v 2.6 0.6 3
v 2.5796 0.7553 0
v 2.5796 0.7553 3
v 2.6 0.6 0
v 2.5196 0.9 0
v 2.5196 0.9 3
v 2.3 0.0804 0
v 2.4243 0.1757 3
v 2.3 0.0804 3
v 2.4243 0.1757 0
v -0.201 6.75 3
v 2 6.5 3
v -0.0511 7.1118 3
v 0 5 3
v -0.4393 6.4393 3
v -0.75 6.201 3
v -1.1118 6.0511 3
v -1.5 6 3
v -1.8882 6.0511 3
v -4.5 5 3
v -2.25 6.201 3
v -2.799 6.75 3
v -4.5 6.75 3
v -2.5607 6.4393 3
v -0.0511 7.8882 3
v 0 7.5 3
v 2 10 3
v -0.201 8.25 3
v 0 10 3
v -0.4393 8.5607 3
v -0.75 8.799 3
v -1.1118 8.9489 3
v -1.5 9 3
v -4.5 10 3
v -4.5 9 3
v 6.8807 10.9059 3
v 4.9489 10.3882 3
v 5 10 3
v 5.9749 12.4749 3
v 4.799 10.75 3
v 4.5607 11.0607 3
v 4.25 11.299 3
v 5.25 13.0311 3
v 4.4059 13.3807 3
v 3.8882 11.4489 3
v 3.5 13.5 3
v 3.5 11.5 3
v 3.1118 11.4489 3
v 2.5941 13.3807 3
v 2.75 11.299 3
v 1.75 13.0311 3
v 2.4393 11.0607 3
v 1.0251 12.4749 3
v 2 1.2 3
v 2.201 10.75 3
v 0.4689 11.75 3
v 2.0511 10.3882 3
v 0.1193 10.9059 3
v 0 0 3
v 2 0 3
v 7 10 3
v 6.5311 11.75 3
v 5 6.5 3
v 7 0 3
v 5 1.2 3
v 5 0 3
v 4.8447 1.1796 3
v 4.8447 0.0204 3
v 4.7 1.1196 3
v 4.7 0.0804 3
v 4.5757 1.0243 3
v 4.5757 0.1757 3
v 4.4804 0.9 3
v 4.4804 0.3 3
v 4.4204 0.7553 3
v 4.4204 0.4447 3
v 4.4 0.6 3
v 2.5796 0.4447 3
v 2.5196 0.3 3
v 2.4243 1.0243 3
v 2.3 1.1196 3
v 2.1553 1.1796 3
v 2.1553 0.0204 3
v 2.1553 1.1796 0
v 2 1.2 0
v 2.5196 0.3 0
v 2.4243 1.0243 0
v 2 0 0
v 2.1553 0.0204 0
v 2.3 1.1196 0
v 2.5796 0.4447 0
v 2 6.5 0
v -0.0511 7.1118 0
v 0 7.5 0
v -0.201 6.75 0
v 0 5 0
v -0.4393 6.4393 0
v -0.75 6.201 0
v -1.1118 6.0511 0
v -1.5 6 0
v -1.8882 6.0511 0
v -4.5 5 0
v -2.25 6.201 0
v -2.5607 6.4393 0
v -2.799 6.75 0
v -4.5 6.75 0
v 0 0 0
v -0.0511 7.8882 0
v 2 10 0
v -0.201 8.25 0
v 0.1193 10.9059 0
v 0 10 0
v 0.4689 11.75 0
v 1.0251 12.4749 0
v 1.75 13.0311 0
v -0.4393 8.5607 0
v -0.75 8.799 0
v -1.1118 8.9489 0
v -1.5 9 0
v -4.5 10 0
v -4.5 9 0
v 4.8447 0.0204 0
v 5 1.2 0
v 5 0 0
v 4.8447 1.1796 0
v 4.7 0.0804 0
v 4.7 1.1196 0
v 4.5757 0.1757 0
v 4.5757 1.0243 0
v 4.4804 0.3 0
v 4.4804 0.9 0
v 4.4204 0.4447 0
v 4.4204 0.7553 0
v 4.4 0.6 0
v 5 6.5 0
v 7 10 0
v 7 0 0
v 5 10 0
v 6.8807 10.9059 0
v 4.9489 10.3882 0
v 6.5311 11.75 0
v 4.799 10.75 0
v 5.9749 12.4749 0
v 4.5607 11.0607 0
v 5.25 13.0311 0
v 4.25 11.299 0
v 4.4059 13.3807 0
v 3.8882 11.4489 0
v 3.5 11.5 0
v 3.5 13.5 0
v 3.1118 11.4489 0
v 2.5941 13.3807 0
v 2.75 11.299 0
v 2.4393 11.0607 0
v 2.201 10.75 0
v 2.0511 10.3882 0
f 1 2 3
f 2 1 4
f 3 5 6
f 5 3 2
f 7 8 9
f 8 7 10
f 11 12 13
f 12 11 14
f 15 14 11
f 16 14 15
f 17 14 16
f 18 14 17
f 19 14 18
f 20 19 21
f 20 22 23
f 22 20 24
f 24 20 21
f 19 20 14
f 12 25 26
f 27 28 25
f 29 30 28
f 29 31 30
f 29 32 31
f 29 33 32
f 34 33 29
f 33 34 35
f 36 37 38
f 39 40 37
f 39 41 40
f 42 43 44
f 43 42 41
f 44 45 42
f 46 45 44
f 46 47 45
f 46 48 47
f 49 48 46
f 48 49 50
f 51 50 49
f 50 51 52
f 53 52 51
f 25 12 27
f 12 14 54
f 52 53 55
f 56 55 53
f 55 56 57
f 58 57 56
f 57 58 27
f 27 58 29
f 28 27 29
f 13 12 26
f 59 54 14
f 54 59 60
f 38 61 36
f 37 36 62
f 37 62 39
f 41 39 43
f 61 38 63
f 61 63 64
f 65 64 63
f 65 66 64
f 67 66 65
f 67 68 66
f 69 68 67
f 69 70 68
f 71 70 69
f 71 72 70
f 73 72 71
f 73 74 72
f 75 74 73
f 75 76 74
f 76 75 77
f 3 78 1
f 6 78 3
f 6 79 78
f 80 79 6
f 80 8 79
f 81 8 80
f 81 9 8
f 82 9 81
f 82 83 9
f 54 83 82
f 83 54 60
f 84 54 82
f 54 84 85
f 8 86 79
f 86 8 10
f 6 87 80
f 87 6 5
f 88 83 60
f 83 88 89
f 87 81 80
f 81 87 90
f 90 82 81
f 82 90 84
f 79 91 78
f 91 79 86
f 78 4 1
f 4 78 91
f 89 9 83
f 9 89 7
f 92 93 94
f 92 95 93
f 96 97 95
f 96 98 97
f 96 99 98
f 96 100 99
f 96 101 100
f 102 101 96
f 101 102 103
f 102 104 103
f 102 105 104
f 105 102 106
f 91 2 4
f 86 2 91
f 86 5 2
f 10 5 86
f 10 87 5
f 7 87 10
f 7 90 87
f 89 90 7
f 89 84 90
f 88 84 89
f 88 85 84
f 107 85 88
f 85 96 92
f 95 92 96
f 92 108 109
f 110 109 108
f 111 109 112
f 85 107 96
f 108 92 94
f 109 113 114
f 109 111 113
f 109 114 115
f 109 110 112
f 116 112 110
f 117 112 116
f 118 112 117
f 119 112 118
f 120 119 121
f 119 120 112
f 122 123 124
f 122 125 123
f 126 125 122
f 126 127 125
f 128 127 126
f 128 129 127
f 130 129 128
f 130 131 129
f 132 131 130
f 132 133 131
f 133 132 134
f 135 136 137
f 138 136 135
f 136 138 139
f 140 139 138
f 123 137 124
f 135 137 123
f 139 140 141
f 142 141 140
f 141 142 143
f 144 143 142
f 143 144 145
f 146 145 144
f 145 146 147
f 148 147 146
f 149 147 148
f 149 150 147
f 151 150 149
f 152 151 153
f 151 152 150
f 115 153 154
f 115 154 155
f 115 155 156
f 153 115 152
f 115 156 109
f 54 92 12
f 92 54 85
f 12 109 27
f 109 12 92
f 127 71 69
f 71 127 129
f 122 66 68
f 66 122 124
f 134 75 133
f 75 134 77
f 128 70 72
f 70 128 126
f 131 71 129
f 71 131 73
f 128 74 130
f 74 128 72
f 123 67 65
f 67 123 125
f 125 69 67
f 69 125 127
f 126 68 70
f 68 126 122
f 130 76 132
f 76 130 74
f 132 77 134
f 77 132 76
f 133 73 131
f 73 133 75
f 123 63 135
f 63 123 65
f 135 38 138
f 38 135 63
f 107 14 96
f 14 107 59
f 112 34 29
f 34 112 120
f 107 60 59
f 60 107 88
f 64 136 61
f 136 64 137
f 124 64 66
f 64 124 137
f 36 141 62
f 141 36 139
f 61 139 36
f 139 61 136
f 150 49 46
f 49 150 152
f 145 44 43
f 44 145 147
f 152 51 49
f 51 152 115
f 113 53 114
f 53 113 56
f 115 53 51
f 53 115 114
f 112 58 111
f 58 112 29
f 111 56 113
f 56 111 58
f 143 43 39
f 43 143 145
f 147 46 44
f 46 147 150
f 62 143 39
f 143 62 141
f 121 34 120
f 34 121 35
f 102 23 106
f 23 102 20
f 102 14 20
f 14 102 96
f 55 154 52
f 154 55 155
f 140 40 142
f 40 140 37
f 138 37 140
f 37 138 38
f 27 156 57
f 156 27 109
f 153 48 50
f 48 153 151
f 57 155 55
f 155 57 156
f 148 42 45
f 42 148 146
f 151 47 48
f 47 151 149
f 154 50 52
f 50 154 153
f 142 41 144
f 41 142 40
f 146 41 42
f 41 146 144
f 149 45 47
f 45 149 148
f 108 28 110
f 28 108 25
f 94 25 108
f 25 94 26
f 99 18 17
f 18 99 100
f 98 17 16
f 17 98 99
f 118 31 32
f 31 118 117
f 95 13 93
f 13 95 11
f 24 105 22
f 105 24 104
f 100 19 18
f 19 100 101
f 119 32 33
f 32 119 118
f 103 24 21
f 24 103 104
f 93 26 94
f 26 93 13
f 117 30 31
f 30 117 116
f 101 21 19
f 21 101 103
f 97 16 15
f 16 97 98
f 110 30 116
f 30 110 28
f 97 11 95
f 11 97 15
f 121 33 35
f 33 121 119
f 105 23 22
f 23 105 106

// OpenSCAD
//Customizable Filament Clip by Dealmann


//Diameter of your filament.
fc_filament=3;

//Thickness of your spool.
fc_spool=2;

//In case your spool has a rim.
fc_rim=0;

//Length of the clips "arms".
fc_length=10;

//Width of the clip.
fc_width=3;

//Thickness of the clip.
fc_thickness=2;





difference()
	{
		union()
			{
				cube([fc_thickness, fc_length, fc_width]);

				translate([fc_thickness+fc_rim+fc_spool+1, 0, 0])
				cube([fc_thickness, fc_length, fc_width]);

				translate([fc_thickness+(fc_rim+fc_spool+1)/2, fc_length,0])
				cylinder(r=fc_thickness+(fc_rim+fc_spool+1)/2, h=fc_width, $fn=24);

				difference()
					{
						translate([fc_thickness,0.5+fc_rim/2+fc_spool*0.05,0])
						cylinder(r=0.5+fc_rim/2+fc_spool*0.05,h=fc_width, $fn=24);

						translate([fc_thickness-(0.5+fc_rim/2+fc_spool*0.05+1),0,-1])
						cube([0.5+fc_rim/2+fc_spool*0.05+1,(0.5+fc_rim/2+fc_spool*0.05)*2,fc_width+2]);
					}
				
				difference()
					{
						translate([fc_thickness+fc_rim+fc_spool+1,0.5+fc_rim/2+fc_spool*0.05,0])
						cylinder(r=0.5+fc_rim/2+fc_spool*0.05,h=fc_width, $fn=24);

						translate([fc_thickness+fc_rim+fc_spool+1,0,-1])
						cube([0.5+fc_rim/2+fc_spool*0.05+1,(0.5+fc_rim/2+fc_spool*0.05)*2,fc_width+2]);
				
					}

				translate([-fc_filament*1.5,fc_length-(fc_filament+2),0])
				cube([fc_filament*1.5,fc_filament+2,fc_width]);

			}
		translate([fc_thickness+(fc_rim+fc_spool+1)/2, fc_length,-1])
		cylinder(r=(fc_rim+fc_spool+1)/2, h=fc_width+2, $fn=24);

		translate([fc_thickness,fc_length-(fc_thickness+(fc_rim+fc_spool+1)/2),-1])
		cube([fc_rim+fc_spool+1, fc_thickness+(fc_rim+fc_spool+1)/2, fc_width+2]);

		translate([-fc_filament/2,fc_length-fc_filament/2-1,-1])
		cylinder(r=fc_filament/2, h=fc_width+2, $fn=24);

		translate([-fc_filament*1.5-1,fc_length-fc_filament*0.75-1,-1])
		cube([fc_filament+1,fc_filament*0.75,fc_width+2]);
	}
